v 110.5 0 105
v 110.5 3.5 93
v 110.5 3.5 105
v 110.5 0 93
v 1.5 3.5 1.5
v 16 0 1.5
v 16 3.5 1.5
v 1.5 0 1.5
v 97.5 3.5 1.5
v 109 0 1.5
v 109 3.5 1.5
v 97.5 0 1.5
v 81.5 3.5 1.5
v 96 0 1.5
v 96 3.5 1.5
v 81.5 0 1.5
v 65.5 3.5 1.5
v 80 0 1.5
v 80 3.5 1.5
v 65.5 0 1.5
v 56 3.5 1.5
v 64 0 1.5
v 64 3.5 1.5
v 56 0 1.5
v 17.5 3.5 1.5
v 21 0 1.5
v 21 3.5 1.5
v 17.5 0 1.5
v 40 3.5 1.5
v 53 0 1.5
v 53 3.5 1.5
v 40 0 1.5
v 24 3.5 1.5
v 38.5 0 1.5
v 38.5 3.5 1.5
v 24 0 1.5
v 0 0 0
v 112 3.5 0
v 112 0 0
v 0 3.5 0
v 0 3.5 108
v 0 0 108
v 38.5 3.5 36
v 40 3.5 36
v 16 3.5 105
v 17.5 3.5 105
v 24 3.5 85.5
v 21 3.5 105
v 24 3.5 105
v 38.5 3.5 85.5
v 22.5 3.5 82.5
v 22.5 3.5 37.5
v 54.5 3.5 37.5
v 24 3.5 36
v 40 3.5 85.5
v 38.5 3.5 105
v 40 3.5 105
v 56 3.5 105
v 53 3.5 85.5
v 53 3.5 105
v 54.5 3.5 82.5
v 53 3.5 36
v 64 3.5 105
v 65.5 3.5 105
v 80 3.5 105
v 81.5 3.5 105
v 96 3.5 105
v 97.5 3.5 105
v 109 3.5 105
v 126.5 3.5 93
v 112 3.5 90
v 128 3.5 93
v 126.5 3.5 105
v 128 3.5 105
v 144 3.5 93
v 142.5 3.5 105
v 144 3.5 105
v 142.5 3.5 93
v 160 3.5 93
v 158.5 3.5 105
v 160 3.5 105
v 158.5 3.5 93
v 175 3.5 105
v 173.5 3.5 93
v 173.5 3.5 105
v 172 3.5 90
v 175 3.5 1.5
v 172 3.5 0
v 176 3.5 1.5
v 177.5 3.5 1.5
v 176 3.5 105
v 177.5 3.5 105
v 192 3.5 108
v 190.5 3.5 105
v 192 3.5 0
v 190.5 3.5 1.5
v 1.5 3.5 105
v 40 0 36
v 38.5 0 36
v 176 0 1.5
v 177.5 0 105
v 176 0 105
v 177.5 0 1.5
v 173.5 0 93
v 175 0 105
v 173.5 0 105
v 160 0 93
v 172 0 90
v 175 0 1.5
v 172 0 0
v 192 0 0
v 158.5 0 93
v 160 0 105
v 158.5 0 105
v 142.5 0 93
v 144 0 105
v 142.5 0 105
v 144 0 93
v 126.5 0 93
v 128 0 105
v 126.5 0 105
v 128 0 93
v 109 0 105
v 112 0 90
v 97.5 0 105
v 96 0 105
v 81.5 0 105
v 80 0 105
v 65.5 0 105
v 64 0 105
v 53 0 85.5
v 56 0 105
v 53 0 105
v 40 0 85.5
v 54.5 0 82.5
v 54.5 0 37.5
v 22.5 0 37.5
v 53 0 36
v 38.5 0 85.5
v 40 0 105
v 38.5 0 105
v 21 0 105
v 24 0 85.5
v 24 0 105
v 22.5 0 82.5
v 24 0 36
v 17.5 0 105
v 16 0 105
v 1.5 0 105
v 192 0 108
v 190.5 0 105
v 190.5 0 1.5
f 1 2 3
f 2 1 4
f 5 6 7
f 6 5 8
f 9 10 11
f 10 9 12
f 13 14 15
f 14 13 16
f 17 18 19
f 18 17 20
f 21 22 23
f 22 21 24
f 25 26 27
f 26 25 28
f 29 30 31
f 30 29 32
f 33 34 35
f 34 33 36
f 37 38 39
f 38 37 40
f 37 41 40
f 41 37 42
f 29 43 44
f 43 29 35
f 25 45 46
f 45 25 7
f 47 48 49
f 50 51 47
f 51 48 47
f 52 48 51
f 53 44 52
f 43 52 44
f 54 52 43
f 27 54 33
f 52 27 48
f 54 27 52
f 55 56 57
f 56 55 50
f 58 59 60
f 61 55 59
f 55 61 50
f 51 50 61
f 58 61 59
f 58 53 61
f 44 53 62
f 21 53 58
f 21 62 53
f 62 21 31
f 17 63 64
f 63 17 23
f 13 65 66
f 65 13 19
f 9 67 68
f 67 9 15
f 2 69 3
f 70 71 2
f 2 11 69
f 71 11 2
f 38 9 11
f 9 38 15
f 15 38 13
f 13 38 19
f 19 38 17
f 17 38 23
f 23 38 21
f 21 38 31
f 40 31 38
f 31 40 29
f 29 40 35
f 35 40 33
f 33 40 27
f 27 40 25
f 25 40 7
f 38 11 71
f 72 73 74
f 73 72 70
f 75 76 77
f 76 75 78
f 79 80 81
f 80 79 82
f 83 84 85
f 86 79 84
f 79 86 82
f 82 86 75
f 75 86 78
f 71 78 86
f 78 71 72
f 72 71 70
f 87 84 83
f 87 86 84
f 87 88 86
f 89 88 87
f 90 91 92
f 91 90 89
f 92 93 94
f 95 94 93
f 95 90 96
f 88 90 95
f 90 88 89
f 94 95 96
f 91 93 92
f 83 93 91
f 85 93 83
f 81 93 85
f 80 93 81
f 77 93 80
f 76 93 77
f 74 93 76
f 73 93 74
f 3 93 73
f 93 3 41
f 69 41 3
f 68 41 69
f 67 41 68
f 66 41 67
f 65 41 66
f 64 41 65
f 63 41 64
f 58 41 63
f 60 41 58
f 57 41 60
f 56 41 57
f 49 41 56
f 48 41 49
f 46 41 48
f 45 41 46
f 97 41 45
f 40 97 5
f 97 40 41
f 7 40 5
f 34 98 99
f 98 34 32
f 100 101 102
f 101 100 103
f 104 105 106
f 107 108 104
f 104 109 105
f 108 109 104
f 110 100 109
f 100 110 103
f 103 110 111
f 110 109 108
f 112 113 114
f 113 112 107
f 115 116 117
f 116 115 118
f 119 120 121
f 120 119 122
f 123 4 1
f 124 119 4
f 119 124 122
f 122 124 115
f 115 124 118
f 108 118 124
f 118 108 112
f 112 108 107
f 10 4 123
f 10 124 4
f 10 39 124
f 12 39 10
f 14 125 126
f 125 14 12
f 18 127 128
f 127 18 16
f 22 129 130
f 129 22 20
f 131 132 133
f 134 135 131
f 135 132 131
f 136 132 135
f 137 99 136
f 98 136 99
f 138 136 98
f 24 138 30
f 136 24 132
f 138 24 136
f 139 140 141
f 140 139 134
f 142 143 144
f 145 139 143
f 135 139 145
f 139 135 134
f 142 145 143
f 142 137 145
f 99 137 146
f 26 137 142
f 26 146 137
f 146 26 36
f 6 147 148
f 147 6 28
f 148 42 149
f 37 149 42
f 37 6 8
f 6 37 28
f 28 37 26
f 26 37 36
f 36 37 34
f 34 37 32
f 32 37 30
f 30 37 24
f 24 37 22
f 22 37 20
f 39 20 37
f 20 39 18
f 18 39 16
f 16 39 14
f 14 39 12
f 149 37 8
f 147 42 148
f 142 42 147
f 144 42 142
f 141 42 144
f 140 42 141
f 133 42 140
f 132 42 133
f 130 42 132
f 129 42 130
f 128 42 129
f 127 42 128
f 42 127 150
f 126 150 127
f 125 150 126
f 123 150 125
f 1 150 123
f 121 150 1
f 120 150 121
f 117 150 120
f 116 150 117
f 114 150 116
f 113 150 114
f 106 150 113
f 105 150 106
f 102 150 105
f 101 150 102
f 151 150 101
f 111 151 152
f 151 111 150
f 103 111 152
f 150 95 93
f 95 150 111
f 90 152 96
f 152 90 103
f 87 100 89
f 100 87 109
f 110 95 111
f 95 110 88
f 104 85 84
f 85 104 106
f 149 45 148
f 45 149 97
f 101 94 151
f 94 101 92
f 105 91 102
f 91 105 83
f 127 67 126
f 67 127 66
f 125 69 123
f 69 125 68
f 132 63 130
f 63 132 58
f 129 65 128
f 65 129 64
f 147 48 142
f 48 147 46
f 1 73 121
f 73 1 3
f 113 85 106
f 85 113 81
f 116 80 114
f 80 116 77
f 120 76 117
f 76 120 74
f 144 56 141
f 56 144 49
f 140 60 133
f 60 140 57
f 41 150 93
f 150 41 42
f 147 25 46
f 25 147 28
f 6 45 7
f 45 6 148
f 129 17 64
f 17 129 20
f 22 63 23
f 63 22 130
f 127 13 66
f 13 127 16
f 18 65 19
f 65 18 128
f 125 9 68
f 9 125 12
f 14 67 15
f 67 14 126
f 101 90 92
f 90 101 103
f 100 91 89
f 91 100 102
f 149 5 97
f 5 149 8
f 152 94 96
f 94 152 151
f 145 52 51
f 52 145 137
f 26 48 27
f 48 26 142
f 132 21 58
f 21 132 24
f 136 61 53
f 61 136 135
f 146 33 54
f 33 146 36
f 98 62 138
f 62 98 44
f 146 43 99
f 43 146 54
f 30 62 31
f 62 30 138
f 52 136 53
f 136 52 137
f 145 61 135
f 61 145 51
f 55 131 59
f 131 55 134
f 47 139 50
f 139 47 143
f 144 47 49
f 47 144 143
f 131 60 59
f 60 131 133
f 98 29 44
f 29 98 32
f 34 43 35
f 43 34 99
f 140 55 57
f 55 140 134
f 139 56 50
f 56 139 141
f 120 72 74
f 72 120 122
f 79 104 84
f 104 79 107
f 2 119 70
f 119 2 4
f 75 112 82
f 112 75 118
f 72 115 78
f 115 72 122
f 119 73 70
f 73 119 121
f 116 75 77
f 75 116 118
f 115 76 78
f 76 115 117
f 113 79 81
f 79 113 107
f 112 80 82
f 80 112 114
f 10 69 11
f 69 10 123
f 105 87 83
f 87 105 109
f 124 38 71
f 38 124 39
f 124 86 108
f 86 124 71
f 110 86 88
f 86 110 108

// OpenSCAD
// Framing Wall - 9' x 16' with 29"x45" window (left) and 5'x7.5' door (right)
// Units: inches

// Wall dimensions
WALL_W = 192;   // 16'
WALL_H = 108;   // 9'

// 2x4 actual dimensions
LT = 1.5;   // thickness
LW = 3.5;   // width / wall depth

// Stud spacing on center
OC = 16;

// Window rough opening
WIN_W = 29;
WIN_H = 45;
WIN_L = 24;   // left edge of RO from wall left
WIN_SH = 36;  // sill z from sub-floor (bottom of sill plate)

// Door rough opening
DOOR_W = 60;  // 5'
DOOR_H = 90;  // 7.5' = 90"
DOOR_L = 112; // left edge of RO from wall left

// --- Derived window positions ---
WKL = WIN_L - 2*LT;        // left king stud x
WJL = WIN_L - LT;          // left jack stud x
WJR = WIN_L + WIN_W;       // right jack stud x
WKR = WIN_L + WIN_W + LT;  // right king stud x

W_SILL_Z = WIN_SH;               // z of sill plate bottom
W_HDR_Z  = WIN_SH + LT + WIN_H;  // z of header bottom (above sill + LT + RO height)

// --- Derived door positions ---
DKL = DOOR_L - 2*LT;
DJL = DOOR_L - LT;
DJR = DOOR_L + DOOR_W;
DKR = DOOR_L + DOOR_W + LT;

D_HDR_Z = DOOR_H;  // jack studs go from z=0 to z=DOOR_H

// Stud height between plates
STUD_H = WALL_H - LT - 2*LT;  // 103.5"

// --- Primitives ---

module vstud(x_pos, z_bot, height) {
    translate([x_pos, 0, z_bot])
        cube([LT, LW, height]);
}

module hbeam(x_pos, z_bot, width) {
    translate([x_pos, 0, z_bot])
        cube([width, LW, LT]);
}

// --- Wall plates ---

module bottom_plate() {
    hbeam(0, 0, DJL);                         // left of door
    hbeam(DJR + LT, 0, WALL_W - DJR - LT);   // right of door
}

module top_plate() {
    hbeam(0, WALL_H - 2*LT, WALL_W);
    hbeam(0, WALL_H - LT,   WALL_W);
}

// --- Field studs at 16" OC, skipping opening zones ---

module field_studs() {
    vstud(0, LT, STUD_H);             // left end stud
    vstud(WALL_W - LT, LT, STUD_H);  // right end stud

    for (x = [OC : OC : WALL_W - LT]) {
        in_win  = (x >= WKL - 0.01) && (x <= WKR + 0.01);
        in_door = (x >= DKL - 0.01) && (x <= DKR + 0.01);
        if (!in_win && !in_door)
            vstud(x, LT, STUD_H);
    }
}

// --- Window framing ---

module window_framing() {
    // King studs (full stud height, rest on bottom plate)
    vstud(WKL, LT, STUD_H);
    vstud(WKR, LT, STUD_H);

    // Lower jack studs (bottom plate to sill)
    vstud(WJL, LT, WIN_SH - LT);
    vstud(WJR, LT, WIN_SH - LT);

    // Sill plate
    hbeam(WJL, W_SILL_Z, WIN_W + 2*LT);

    // Double header
    hbeam(WKL, W_HDR_Z,       WIN_W + 4*LT);
    hbeam(WKL, W_HDR_Z + LT,  WIN_W + 4*LT);

    // Upper jack studs (header to top plate)
    z_ahdr = W_HDR_Z + 2*LT;
    vstud(WJL, z_ahdr, WALL_H - 2*LT - z_ahdr);
    vstud(WJR, z_ahdr, WALL_H - 2*LT - z_ahdr);

    // Cripple studs below sill
    for (x = [WJL + OC : OC : WJR]) {
        if (x + LT <= WJR + 0.01)
            vstud(x, LT, WIN_SH - LT);
    }

    // Cripple studs above header
    z_ahdr = W_HDR_Z + 2*LT;
    for (x = [WJL + OC : OC : WJR]) {
        if (x + LT <= WJR + 0.01)
            vstud(x, z_ahdr, WALL_H - 2*LT - z_ahdr);
    }
}

// --- Door framing ---

module door_framing() {
    // King studs (rest on bottom plate)
    vstud(DKL, LT, STUD_H);
    vstud(DKR, LT, STUD_H);

    // Jack studs (from sub-floor to door header height)
    vstud(DJL, 0, D_HDR_Z);
    vstud(DJR, 0, D_HDR_Z);

    // Double header
    hbeam(DKL, D_HDR_Z,       DOOR_W + 4*LT);
    hbeam(DKL, D_HDR_Z + LT,  DOOR_W + 4*LT);

    // Cripple studs above header
    z_ahdr = D_HDR_Z + 2*LT;
    for (x = [DJL + OC : OC : DJR]) {
        if (x + LT <= DJR + 0.01)
            vstud(x, z_ahdr, WALL_H - 2*LT - z_ahdr);
    }
}

// --- Assembly ---

color("BurlyWood") union() {
    bottom_plate();
    top_plate();
    field_studs();
    window_framing();
    door_framing();
}
